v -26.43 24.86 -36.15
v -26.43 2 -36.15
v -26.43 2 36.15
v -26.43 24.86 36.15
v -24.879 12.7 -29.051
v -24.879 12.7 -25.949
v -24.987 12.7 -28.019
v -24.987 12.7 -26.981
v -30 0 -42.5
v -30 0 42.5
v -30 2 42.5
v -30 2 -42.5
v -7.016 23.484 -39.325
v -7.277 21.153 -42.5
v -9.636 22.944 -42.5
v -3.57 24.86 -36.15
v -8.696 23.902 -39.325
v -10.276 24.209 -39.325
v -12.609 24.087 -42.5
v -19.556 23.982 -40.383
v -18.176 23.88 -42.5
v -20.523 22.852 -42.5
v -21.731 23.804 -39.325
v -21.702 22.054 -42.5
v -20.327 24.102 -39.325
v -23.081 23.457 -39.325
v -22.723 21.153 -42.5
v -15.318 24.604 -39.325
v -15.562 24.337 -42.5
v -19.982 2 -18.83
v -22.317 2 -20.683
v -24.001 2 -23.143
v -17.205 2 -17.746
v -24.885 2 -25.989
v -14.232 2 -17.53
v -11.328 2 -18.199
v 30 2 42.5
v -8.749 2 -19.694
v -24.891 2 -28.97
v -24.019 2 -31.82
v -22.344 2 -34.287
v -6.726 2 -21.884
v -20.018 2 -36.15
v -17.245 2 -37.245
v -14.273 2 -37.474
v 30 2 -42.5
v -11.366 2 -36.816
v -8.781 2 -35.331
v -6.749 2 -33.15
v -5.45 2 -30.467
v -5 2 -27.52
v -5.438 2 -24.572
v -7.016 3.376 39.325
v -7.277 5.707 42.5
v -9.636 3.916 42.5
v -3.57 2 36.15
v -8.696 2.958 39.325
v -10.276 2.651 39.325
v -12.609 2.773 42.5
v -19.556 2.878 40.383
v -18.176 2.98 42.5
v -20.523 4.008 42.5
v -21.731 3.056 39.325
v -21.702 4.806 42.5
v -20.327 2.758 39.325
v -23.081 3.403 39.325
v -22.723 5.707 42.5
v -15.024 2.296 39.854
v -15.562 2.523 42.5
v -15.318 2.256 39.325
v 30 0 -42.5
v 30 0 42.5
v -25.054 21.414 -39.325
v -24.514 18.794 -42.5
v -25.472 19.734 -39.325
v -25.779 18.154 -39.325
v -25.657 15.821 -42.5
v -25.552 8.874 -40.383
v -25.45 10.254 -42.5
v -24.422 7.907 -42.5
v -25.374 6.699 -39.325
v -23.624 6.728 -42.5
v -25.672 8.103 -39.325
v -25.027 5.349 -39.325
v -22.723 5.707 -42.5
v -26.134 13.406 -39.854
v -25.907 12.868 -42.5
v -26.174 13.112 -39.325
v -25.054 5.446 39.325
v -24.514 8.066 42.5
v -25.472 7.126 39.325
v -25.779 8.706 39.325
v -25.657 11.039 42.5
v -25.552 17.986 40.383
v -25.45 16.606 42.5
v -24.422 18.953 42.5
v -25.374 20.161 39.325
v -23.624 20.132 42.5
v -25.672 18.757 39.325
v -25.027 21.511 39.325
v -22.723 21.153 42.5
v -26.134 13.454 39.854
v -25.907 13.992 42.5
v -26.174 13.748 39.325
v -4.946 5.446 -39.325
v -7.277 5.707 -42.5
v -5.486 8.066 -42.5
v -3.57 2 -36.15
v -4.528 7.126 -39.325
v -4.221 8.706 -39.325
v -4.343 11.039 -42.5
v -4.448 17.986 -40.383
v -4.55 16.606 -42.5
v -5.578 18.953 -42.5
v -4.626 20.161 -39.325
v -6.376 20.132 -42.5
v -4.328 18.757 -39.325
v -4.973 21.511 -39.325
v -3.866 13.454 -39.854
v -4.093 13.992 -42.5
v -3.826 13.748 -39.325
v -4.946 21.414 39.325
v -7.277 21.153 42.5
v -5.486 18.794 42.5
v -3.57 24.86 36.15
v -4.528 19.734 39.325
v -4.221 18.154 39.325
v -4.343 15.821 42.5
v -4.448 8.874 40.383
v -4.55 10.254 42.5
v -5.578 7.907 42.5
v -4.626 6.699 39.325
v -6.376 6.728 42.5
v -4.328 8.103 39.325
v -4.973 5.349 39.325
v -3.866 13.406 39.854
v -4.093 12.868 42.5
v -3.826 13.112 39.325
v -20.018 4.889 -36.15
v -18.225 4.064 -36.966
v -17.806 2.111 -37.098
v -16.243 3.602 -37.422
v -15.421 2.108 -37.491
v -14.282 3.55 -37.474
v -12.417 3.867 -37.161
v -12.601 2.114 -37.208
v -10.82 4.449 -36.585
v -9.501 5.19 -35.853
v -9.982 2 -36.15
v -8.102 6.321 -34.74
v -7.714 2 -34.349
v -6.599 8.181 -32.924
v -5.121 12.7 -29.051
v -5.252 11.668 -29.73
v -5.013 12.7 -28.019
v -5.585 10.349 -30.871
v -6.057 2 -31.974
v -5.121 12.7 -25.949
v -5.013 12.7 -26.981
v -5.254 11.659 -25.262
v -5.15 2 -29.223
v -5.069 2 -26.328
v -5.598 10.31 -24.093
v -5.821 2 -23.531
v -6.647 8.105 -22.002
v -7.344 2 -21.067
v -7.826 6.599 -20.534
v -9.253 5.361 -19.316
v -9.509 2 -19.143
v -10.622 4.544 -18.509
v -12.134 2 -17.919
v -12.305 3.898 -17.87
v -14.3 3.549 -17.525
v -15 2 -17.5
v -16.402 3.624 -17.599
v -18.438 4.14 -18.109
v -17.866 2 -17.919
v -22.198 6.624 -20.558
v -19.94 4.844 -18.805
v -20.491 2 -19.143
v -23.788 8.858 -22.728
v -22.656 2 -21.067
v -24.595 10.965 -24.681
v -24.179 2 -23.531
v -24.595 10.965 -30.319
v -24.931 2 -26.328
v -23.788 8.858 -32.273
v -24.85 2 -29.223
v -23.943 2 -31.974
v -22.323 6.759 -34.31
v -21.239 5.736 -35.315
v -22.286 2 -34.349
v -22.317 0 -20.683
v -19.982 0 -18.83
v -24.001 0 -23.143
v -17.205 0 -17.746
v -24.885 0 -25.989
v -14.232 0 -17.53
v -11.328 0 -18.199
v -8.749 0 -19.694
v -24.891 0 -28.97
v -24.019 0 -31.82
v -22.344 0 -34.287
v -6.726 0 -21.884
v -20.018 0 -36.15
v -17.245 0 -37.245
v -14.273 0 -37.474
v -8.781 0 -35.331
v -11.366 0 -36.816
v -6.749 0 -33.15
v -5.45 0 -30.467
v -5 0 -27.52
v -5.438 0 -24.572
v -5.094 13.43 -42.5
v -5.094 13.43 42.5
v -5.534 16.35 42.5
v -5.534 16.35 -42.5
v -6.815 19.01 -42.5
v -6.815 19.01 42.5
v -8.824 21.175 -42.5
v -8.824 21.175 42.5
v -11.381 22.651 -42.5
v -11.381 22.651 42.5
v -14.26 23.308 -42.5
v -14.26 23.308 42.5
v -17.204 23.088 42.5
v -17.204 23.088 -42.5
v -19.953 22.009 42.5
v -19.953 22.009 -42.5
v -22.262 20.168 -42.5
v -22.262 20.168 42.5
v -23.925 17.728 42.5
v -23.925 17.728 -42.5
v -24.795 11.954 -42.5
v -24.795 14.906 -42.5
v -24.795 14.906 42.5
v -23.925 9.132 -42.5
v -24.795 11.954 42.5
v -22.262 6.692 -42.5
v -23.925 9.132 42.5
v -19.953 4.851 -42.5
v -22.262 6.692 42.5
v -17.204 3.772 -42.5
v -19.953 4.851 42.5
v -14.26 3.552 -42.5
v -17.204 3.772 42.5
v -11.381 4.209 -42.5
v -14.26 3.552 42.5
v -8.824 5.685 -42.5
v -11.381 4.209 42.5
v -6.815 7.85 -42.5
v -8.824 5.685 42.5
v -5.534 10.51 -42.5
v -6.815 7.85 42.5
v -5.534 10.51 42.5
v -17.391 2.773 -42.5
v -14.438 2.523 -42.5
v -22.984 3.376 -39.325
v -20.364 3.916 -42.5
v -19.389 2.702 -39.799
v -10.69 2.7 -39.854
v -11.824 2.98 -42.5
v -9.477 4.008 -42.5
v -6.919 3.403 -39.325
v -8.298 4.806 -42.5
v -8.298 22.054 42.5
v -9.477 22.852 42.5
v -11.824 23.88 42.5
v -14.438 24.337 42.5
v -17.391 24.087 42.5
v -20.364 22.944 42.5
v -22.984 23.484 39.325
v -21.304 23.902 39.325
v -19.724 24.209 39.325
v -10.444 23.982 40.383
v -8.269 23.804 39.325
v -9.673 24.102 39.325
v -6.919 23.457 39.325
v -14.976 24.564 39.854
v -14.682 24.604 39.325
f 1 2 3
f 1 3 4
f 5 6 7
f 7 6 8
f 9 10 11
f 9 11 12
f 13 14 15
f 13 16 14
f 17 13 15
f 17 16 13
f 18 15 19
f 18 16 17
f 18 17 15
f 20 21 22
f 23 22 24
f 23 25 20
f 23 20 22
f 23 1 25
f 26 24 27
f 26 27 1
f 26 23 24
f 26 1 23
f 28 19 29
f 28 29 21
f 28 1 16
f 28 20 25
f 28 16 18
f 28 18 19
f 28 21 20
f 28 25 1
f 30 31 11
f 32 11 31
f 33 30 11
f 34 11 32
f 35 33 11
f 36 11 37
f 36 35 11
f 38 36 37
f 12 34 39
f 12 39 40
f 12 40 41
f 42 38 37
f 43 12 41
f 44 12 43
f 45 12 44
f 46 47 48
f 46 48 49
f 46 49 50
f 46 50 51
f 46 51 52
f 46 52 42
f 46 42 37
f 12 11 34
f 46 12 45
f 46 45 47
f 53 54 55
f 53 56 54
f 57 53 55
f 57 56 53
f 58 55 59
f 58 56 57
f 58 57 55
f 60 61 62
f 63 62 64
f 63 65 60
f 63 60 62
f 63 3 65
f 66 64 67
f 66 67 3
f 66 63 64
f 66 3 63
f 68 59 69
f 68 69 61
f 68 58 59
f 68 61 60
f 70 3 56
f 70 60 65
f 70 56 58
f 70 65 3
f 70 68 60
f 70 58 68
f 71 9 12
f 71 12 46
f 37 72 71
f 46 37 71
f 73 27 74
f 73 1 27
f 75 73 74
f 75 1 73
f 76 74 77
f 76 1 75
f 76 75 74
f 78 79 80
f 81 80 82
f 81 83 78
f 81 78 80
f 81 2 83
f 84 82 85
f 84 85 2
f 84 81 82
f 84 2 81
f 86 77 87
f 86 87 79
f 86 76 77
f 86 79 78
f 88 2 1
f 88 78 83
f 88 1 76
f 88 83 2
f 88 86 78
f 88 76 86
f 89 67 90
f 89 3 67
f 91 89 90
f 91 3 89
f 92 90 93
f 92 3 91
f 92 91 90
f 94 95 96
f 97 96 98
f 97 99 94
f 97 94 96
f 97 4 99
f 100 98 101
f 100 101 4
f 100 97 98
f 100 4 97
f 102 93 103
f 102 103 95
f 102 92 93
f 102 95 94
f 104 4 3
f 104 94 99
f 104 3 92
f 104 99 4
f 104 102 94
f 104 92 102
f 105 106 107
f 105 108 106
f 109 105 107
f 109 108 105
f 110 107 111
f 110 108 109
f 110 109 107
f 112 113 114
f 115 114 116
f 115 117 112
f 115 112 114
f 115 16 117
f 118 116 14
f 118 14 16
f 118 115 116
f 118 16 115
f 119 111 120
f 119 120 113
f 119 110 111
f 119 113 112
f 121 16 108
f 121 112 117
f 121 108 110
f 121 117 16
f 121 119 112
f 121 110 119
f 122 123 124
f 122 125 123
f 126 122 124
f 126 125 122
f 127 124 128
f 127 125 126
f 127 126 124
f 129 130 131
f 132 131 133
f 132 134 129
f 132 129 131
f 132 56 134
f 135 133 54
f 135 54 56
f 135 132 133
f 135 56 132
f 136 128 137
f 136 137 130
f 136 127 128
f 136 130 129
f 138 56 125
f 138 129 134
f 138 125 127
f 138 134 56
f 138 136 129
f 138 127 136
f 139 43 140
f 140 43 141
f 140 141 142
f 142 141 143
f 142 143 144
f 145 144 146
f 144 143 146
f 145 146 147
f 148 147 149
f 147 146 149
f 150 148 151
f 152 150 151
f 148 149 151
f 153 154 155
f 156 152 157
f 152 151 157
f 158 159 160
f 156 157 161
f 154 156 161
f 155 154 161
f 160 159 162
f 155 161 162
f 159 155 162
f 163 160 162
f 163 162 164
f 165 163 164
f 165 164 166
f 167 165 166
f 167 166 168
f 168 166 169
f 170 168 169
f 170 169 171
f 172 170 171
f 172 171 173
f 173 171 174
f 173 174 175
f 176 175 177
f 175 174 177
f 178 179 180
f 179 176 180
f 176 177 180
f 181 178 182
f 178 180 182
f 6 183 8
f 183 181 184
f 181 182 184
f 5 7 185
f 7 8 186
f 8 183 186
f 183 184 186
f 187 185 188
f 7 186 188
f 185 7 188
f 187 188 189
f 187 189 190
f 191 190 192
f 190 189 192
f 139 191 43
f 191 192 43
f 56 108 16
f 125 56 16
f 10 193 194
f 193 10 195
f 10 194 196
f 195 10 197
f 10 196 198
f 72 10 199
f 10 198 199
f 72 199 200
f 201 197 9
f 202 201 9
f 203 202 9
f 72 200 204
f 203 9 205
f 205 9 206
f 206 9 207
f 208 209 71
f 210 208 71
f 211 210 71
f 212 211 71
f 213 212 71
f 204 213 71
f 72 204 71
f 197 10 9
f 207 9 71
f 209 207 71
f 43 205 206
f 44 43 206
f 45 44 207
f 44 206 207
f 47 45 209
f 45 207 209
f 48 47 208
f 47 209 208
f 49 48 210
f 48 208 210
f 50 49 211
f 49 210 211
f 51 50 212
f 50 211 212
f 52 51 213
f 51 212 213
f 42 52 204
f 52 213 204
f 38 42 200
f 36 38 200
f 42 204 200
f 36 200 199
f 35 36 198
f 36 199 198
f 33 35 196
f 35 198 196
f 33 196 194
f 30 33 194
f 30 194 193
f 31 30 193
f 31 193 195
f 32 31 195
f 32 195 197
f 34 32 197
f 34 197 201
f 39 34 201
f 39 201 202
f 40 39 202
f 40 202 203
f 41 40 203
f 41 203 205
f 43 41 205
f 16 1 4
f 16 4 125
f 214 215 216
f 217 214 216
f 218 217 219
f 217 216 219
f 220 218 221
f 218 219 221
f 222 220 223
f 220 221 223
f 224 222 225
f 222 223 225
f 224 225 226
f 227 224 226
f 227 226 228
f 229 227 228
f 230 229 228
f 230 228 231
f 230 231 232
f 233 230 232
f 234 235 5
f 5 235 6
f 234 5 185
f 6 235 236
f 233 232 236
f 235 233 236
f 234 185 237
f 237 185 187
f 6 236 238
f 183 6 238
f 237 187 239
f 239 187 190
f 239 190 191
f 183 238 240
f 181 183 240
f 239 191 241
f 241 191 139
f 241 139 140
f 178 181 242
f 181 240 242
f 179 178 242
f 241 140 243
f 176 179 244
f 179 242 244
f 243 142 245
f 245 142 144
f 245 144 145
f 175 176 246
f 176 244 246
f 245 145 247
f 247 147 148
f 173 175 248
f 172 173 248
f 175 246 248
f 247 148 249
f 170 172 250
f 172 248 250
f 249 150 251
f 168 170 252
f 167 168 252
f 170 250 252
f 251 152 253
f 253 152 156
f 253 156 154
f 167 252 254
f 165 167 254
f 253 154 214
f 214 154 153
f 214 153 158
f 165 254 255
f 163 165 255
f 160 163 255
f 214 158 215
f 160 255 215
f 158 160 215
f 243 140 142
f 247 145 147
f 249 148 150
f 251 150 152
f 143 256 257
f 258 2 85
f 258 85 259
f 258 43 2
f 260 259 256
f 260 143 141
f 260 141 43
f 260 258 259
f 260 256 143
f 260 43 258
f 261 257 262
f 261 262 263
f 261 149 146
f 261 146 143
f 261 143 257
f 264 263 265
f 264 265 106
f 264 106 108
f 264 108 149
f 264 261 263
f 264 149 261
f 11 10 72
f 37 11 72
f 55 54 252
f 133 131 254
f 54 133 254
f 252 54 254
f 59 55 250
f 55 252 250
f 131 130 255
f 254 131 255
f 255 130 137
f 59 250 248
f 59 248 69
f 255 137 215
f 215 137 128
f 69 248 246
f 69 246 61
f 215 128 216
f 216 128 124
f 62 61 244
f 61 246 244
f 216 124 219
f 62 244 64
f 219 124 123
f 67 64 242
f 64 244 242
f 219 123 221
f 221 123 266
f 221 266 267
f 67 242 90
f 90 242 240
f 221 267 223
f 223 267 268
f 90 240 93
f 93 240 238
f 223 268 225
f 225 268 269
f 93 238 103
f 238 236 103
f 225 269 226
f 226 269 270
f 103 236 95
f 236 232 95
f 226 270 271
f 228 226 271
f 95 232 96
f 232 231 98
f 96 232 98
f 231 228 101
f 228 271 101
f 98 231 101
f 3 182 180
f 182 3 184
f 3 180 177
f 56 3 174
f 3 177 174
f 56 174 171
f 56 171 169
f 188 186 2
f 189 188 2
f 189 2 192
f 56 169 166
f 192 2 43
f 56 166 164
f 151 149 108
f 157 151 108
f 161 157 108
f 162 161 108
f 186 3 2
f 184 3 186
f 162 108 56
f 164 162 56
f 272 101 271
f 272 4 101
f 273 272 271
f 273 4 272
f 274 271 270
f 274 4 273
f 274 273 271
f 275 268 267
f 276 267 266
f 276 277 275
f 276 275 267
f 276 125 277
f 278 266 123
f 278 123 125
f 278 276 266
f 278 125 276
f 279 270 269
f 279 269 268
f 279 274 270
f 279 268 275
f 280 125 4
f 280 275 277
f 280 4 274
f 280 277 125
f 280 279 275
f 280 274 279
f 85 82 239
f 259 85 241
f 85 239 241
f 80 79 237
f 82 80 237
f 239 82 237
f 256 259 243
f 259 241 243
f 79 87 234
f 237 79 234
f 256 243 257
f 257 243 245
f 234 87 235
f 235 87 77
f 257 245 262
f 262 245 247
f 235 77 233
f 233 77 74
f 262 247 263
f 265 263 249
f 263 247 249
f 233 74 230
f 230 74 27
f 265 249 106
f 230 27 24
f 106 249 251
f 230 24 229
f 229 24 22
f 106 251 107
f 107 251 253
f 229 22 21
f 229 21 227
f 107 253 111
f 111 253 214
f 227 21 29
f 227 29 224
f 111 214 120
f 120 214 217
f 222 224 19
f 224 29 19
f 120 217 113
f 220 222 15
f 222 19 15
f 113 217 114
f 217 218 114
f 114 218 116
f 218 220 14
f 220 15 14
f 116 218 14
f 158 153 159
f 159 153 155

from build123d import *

# Parameters (mm, degrees)
SKETCH1_W                = 60
SKETCH1_H                = 85
FLOOR_2_DEPTH            = 2
BOSS_EXTRUDE2_DEPTH      = 36.15
BOSS_EXTRUDE2_DEPTH_BACK = 36.15
SKETCH4_W                = 22.86
SKETCH4_H                = 22.86
SKETCH8_R                = 9.906
CUT_EXTRUDE1_DEPTH       = 85
SKETCH9_R                = 10
CUT_EXTRUDE3_DEPTH       = 12.7


with BuildPart() as part:
    # Sketch1 → Floor 2 (new body)
    with BuildSketch(Plane(origin=(0, 0, 0), x_dir=(1, 0, 0), z_dir=(0, 1, 0))):
        Rectangle(SKETCH1_W, SKETCH1_H)
    extrude(amount=FLOOR_2_DEPTH)


with BuildPart() as body_2:
    # Sketch4 → Boss-Extrude2 (new, two sides: drawn at the far end of the back side and taken through both)
    with BuildSketch(Plane.XY.offset(-BOSS_EXTRUDE2_DEPTH_BACK)):
        with Locations((-15, 13.43)):
            Rectangle(SKETCH4_W, SKETCH4_H)
    extrude(amount=BOSS_EXTRUDE2_DEPTH + BOSS_EXTRUDE2_DEPTH_BACK)

    # Loft1: read off the stored shape, not the designer's step
    # Loft1: loft between two sections, ruled curve by curve
    loft1_from = [
        Edge.make_bspline([(-22.723020264, 21.153020264, 42.5), (-22.267936931, 21.608103597, 42.5), (-21.755379228, 22.039749576, 42.5), (-20.622186662, 22.819033678, 42.5), (-20.00149393, 23.16641949, 42.5), (-18.674448049, 23.740734093, 42.5), (-17.968198796, 23.967381387, 42.5), (-16.507843764, 24.27310923, 42.5), (-15.754006755, 24.352, 42.5), (-14.245993245, 24.352, 42.5), (-13.492156236, 24.27310923, 42.5), (-12.031801204, 23.967381387, 42.5), (-11.325551951, 23.740734093, 42.5), (-9.99850607, 23.16641949, 42.5), (-9.377813338, 22.819033678, 42.5), (-8.244620772, 22.039749576, 42.5), (-7.732063069, 21.608103597, 42.5), (-7.276979736, 21.153020264, 42.5)], [0, 0, 0, 0, 0.125, 0.125, 0.25, 0.25, 0.375, 0.375, 0.5, 0.5, 0.625, 0.625, 0.75, 0.75, 0.875, 0.875, 1, 1, 1, 1], 3),
        Edge.make_bspline([(-7.276979736, 21.153020264, 42.5), (-6.821896403, 20.697936931, 42.5), (-6.390250424, 20.185379228, 42.5), (-5.610966322, 19.052186662, 42.5), (-5.26358051, 18.43149393, 42.5), (-4.689265907, 17.104448049, 42.5), (-4.462618613, 16.398198796, 42.5), (-4.15689077, 14.937843764, 42.5), (-4.078, 14.184006755, 42.5), (-4.078, 12.675993245, 42.5), (-4.15689077, 11.922156236, 42.5), (-4.462618613, 10.461801204, 42.5), (-4.689265907, 9.755551951, 42.5), (-5.26358051, 8.42850607, 42.5), (-5.610966322, 7.807813338, 42.5), (-6.390250424, 6.674620772, 42.5), (-6.821896403, 6.162063069, 42.5), (-7.276979736, 5.706979736, 42.5)], [0, 0, 0, 0, 0.125, 0.125, 0.25, 0.25, 0.375, 0.375, 0.5, 0.5, 0.625, 0.625, 0.75, 0.75, 0.875, 0.875, 1, 1, 1, 1], 3),
        Edge.make_bspline([(-22.723020264, 5.706979736, 42.5), (-23.178103597, 6.162063069, 42.5), (-23.609749576, 6.674620772, 42.5), (-24.389033678, 7.807813338, 42.5), (-24.73641949, 8.42850607, 42.5), (-25.310734093, 9.755551951, 42.5), (-25.537381387, 10.461801204, 42.5), (-25.84310923, 11.922156236, 42.5), (-25.922, 12.675993245, 42.5), (-25.922, 14.184006755, 42.5), (-25.84310923, 14.937843764, 42.5), (-25.537381387, 16.398198796, 42.5), (-25.310734093, 17.104448049, 42.5), (-24.73641949, 18.43149393, 42.5), (-24.389033678, 19.052186662, 42.5), (-23.609749576, 20.185379228, 42.5), (-23.178103597, 20.697936931, 42.5), (-22.723020264, 21.153020264, 42.5)], [0, 0, 0, 0, 0.125, 0.125, 0.25, 0.25, 0.375, 0.375, 0.5, 0.5, 0.625, 0.625, 0.75, 0.75, 0.875, 0.875, 1, 1, 1, 1], 3),
        Edge.make_bspline([(-7.276979736, 5.706979736, 42.5), (-7.732063069, 5.251896403, 42.5), (-8.244620772, 4.820250424, 42.5), (-9.377813338, 4.040966322, 42.5), (-9.99850607, 3.69358051, 42.5), (-11.325551951, 3.119265907, 42.5), (-12.031801204, 2.892618613, 42.5), (-13.492156236, 2.58689077, 42.5), (-14.245993245, 2.508, 42.5), (-15.754006755, 2.508, 42.5), (-16.507843764, 2.58689077, 42.5), (-17.968198796, 2.892618613, 42.5), (-18.674448049, 3.119265907, 42.5), (-20.00149393, 3.69358051, 42.5), (-20.622186662, 4.040966322, 42.5), (-21.755379228, 4.820250424, 42.5), (-22.267936931, 5.251896403, 42.5), (-22.723020264, 5.706979736, 42.5)], [0, 0, 0, 0, 0.125, 0.125, 0.25, 0.25, 0.375, 0.375, 0.5, 0.5, 0.625, 0.625, 0.75, 0.75, 0.875, 0.875, 1, 1, 1, 1], 3),
    ]
    loft1_to = [
        Edge.make_bspline([(-26.43, 24.86, 36.15), (-25.4775, 24.86, 36.15), (-24.525, 24.86, 36.15), (-22.62, 24.86, 36.15), (-21.6675, 24.86, 36.15), (-19.7625, 24.86, 36.15), (-18.81, 24.86, 36.15), (-16.905, 24.86, 36.15), (-15.9525, 24.86, 36.15), (-14.0475, 24.86, 36.15), (-13.095, 24.86, 36.15), (-11.19, 24.86, 36.15), (-10.2375, 24.86, 36.15), (-8.3325, 24.86, 36.15), (-7.38, 24.86, 36.15), (-5.475, 24.86, 36.15), (-4.5225, 24.86, 36.15), (-3.57, 24.86, 36.15)], [0, 0, 0, 0, 0.125, 0.125, 0.25, 0.25, 0.375, 0.375, 0.5, 0.5, 0.625, 0.625, 0.75, 0.75, 0.875, 0.875, 1, 1, 1, 1], 3),
        Edge.make_bspline([(-3.57, 24.86, 36.15), (-3.57, 23.9075, 36.15), (-3.57, 22.955, 36.15), (-3.57, 21.05, 36.15), (-3.57, 20.0975, 36.15), (-3.57, 18.1925, 36.15), (-3.57, 17.24, 36.15), (-3.57, 15.335, 36.15), (-3.57, 14.3825, 36.15), (-3.57, 12.4775, 36.15), (-3.57, 11.525, 36.15), (-3.57, 9.62, 36.15), (-3.57, 8.6675, 36.15), (-3.57, 6.7625, 36.15), (-3.57, 5.81, 36.15), (-3.57, 3.905, 36.15), (-3.57, 2.9525, 36.15), (-3.57, 2, 36.15)], [0, 0, 0, 0, 0.125, 0.125, 0.25, 0.25, 0.375, 0.375, 0.5, 0.5, 0.625, 0.625, 0.75, 0.75, 0.875, 0.875, 1, 1, 1, 1], 3),
        Edge.make_bspline([(-26.43, 2, 36.15), (-26.43, 2.9525, 36.15), (-26.43, 3.905, 36.15), (-26.43, 5.81, 36.15), (-26.43, 6.7625, 36.15), (-26.43, 8.6675, 36.15), (-26.43, 9.62, 36.15), (-26.43, 11.525, 36.15), (-26.43, 12.4775, 36.15), (-26.43, 14.3825, 36.15), (-26.43, 15.335, 36.15), (-26.43, 17.24, 36.15), (-26.43, 18.1925, 36.15), (-26.43, 20.0975, 36.15), (-26.43, 21.05, 36.15), (-26.43, 22.955, 36.15), (-26.43, 23.9075, 36.15), (-26.43, 24.86, 36.15)], [0, 0, 0, 0, 0.125, 0.125, 0.25, 0.25, 0.375, 0.375, 0.5, 0.5, 0.625, 0.625, 0.75, 0.75, 0.875, 0.875, 1, 1, 1, 1], 3),
        Edge.make_bspline([(-3.57, 2, 36.15), (-4.5225, 2, 36.15), (-5.475, 2, 36.15), (-7.38, 2, 36.15), (-8.3325, 2, 36.15), (-10.2375, 2, 36.15), (-11.19, 2, 36.15), (-13.095, 2, 36.15), (-14.0475, 2, 36.15), (-15.9525, 2, 36.15), (-16.905, 2, 36.15), (-18.81, 2, 36.15), (-19.7625, 2, 36.15), (-21.6675, 2, 36.15), (-22.62, 2, 36.15), (-24.525, 2, 36.15), (-25.4775, 2, 36.15), (-26.43, 2, 36.15)], [0, 0, 0, 0, 0.125, 0.125, 0.25, 0.25, 0.375, 0.375, 0.5, 0.5, 0.625, 0.625, 0.75, 0.75, 0.875, 0.875, 1, 1, 1, 1], 3),
    ]
    loft1 = Solid(Shell([*[Face.make_surface_from_curves(loft1_from[k], loft1_to[k]) for k in range(4)], Face(Wire(loft1_from)), Face(Wire(loft1_to))]))
    add(loft1)

    # Loft2: read off the stored shape, not the designer's step
    # Loft2: loft between two sections, ruled curve by curve
    loft2_from = [
        Edge.make_bspline([(-7.276979736, 21.153020264, -42.5), (-7.732063069, 21.608103597, -42.5), (-8.244620772, 22.039749576, -42.5), (-9.377813338, 22.819033678, -42.5), (-9.99850607, 23.16641949, -42.5), (-11.325551951, 23.740734093, -42.5), (-12.031801204, 23.967381387, -42.5), (-13.492156236, 24.27310923, -42.5), (-14.245993245, 24.352, -42.5), (-15.754006755, 24.352, -42.5), (-16.507843764, 24.27310923, -42.5), (-17.968198796, 23.967381387, -42.5), (-18.674448049, 23.740734093, -42.5), (-20.00149393, 23.16641949, -42.5), (-20.622186662, 22.819033678, -42.5), (-21.755379228, 22.039749576, -42.5), (-22.267936931, 21.608103597, -42.5), (-22.723020264, 21.153020264, -42.5)], [0, 0, 0, 0, 0.125, 0.125, 0.25, 0.25, 0.375, 0.375, 0.5, 0.5, 0.625, 0.625, 0.75, 0.75, 0.875, 0.875, 1, 1, 1, 1], 3),
        Edge.make_bspline([(-22.723020264, 21.153020264, -42.5), (-23.178103597, 20.697936931, -42.5), (-23.609749576, 20.185379228, -42.5), (-24.389033678, 19.052186662, -42.5), (-24.73641949, 18.43149393, -42.5), (-25.310734093, 17.104448049, -42.5), (-25.537381387, 16.398198796, -42.5), (-25.84310923, 14.937843764, -42.5), (-25.922, 14.184006755, -42.5), (-25.922, 12.675993245, -42.5), (-25.84310923, 11.922156236, -42.5), (-25.537381387, 10.461801204, -42.5), (-25.310734093, 9.755551951, -42.5), (-24.73641949, 8.42850607, -42.5), (-24.389033678, 7.807813338, -42.5), (-23.609749576, 6.674620772, -42.5), (-23.178103597, 6.162063069, -42.5), (-22.723020264, 5.706979736, -42.5)], [0, 0, 0, 0, 0.125, 0.125, 0.25, 0.25, 0.375, 0.375, 0.5, 0.5, 0.625, 0.625, 0.75, 0.75, 0.875, 0.875, 1, 1, 1, 1], 3),
        Edge.make_bspline([(-7.276979736, 5.706979736, -42.5), (-6.821896403, 6.162063069, -42.5), (-6.390250424, 6.674620772, -42.5), (-5.610966322, 7.807813338, -42.5), (-5.26358051, 8.42850607, -42.5), (-4.689265907, 9.755551951, -42.5), (-4.462618613, 10.461801204, -42.5), (-4.15689077, 11.922156236, -42.5), (-4.078, 12.675993245, -42.5), (-4.078, 14.184006755, -42.5), (-4.15689077, 14.937843764, -42.5), (-4.462618613, 16.398198796, -42.5), (-4.689265907, 17.104448049, -42.5), (-5.26358051, 18.43149393, -42.5), (-5.610966322, 19.052186662, -42.5), (-6.390250424, 20.185379228, -42.5), (-6.821896403, 20.697936931, -42.5), (-7.276979736, 21.153020264, -42.5)], [0, 0, 0, 0, 0.125, 0.125, 0.25, 0.25, 0.375, 0.375, 0.5, 0.5, 0.625, 0.625, 0.75, 0.75, 0.875, 0.875, 1, 1, 1, 1], 3),
        Edge.make_bspline([(-22.723020264, 5.706979736, -42.5), (-22.267936931, 5.251896403, -42.5), (-21.755379228, 4.820250424, -42.5), (-20.622186662, 4.040966322, -42.5), (-20.00149393, 3.69358051, -42.5), (-18.674448049, 3.119265907, -42.5), (-17.968198796, 2.892618613, -42.5), (-16.507843764, 2.58689077, -42.5), (-15.754006755, 2.508, -42.5), (-14.245993245, 2.508, -42.5), (-13.492156236, 2.58689077, -42.5), (-12.031801204, 2.892618613, -42.5), (-11.325551951, 3.119265907, -42.5), (-9.99850607, 3.69358051, -42.5), (-9.377813338, 4.040966322, -42.5), (-8.244620772, 4.820250424, -42.5), (-7.732063069, 5.251896403, -42.5), (-7.276979736, 5.706979736, -42.5)], [0, 0, 0, 0, 0.125, 0.125, 0.25, 0.25, 0.375, 0.375, 0.5, 0.5, 0.625, 0.625, 0.75, 0.75, 0.875, 0.875, 1, 1, 1, 1], 3),
    ]
    loft2_to = [
        Edge.make_bspline([(-3.57, 24.86, -36.15), (-4.5225, 24.86, -36.15), (-5.475, 24.86, -36.15), (-7.38, 24.86, -36.15), (-8.3325, 24.86, -36.15), (-10.2375, 24.86, -36.15), (-11.19, 24.86, -36.15), (-13.095, 24.86, -36.15), (-14.0475, 24.86, -36.15), (-15.9525, 24.86, -36.15), (-16.905, 24.86, -36.15), (-18.81, 24.86, -36.15), (-19.7625, 24.86, -36.15), (-21.6675, 24.86, -36.15), (-22.62, 24.86, -36.15), (-24.525, 24.86, -36.15), (-25.4775, 24.86, -36.15), (-26.43, 24.86, -36.15)], [0, 0, 0, 0, 0.125, 0.125, 0.25, 0.25, 0.375, 0.375, 0.5, 0.5, 0.625, 0.625, 0.75, 0.75, 0.875, 0.875, 1, 1, 1, 1], 3),
        Edge.make_bspline([(-26.43, 24.86, -36.15), (-26.43, 23.9075, -36.15), (-26.43, 22.955, -36.15), (-26.43, 21.05, -36.15), (-26.43, 20.0975, -36.15), (-26.43, 18.1925, -36.15), (-26.43, 17.24, -36.15), (-26.43, 15.335, -36.15), (-26.43, 14.3825, -36.15), (-26.43, 12.4775, -36.15), (-26.43, 11.525, -36.15), (-26.43, 9.62, -36.15), (-26.43, 8.6675, -36.15), (-26.43, 6.7625, -36.15), (-26.43, 5.81, -36.15), (-26.43, 3.905, -36.15), (-26.43, 2.9525, -36.15), (-26.43, 2, -36.15)], [0, 0, 0, 0, 0.125, 0.125, 0.25, 0.25, 0.375, 0.375, 0.5, 0.5, 0.625, 0.625, 0.75, 0.75, 0.875, 0.875, 1, 1, 1, 1], 3),
        Edge.make_bspline([(-3.57, 2, -36.15), (-3.57, 2.9525, -36.15), (-3.57, 3.905, -36.15), (-3.57, 5.81, -36.15), (-3.57, 6.7625, -36.15), (-3.57, 8.6675, -36.15), (-3.57, 9.62, -36.15), (-3.57, 11.525, -36.15), (-3.57, 12.4775, -36.15), (-3.57, 14.3825, -36.15), (-3.57, 15.335, -36.15), (-3.57, 17.24, -36.15), (-3.57, 18.1925, -36.15), (-3.57, 20.0975, -36.15), (-3.57, 21.05, -36.15), (-3.57, 22.955, -36.15), (-3.57, 23.9075, -36.15), (-3.57, 24.86, -36.15)], [0, 0, 0, 0, 0.125, 0.125, 0.25, 0.25, 0.375, 0.375, 0.5, 0.5, 0.625, 0.625, 0.75, 0.75, 0.875, 0.875, 1, 1, 1, 1], 3),
        Edge.make_bspline([(-26.43, 2, -36.15), (-25.4775, 2, -36.15), (-24.525, 2, -36.15), (-22.62, 2, -36.15), (-21.6675, 2, -36.15), (-19.7625, 2, -36.15), (-18.81, 2, -36.15), (-16.905, 2, -36.15), (-15.9525, 2, -36.15), (-14.0475, 2, -36.15), (-13.095, 2, -36.15), (-11.19, 2, -36.15), (-10.2375, 2, -36.15), (-8.3325, 2, -36.15), (-7.38, 2, -36.15), (-5.475, 2, -36.15), (-4.5225, 2, -36.15), (-3.57, 2, -36.15)], [0, 0, 0, 0, 0.125, 0.125, 0.25, 0.25, 0.375, 0.375, 0.5, 0.5, 0.625, 0.625, 0.75, 0.75, 0.875, 0.875, 1, 1, 1, 1], 3),
    ]
    loft2 = Solid(Shell([*[Face.make_surface_from_curves(loft2_from[k], loft2_to[k]) for k in range(4)], Face(Wire(loft2_from)), Face(Wire(loft2_to))]))
    add(loft2)

    # Sketch8 → Cut-Extrude1 (cut)
    with BuildSketch(Plane.XY.offset(42.5)):
        with Locations((-15, 13.43)):
            Circle(SKETCH8_R)
    extrude(amount=-CUT_EXTRUDE1_DEPTH, mode=Mode.SUBTRACT)


with BuildPart() as cut_extrude3_tool:
    # Sketch9 → Cut-Extrude3 (new body)
    with BuildSketch(Plane.XZ):
        with Locations(Location((-15, -27.5, 0), (0, 0, 239.882705253))):
            Circle(SKETCH9_R)
    extrude(amount=-CUT_EXTRUDE3_DEPTH)


with BuildPart() as part_1:
    add(part.part)

    # Cut-Extrude3: cut by cut_extrude3_tool
    add(cut_extrude3_tool.part, mode=Mode.SUBTRACT)


with BuildPart() as body_2_1:
    add(body_2.part)

    # Cut-Extrude3: cut by cut_extrude3_tool
    add(cut_extrude3_tool.part, mode=Mode.SUBTRACT)


solid = Compound([part_1.part, body_2_1.part])
